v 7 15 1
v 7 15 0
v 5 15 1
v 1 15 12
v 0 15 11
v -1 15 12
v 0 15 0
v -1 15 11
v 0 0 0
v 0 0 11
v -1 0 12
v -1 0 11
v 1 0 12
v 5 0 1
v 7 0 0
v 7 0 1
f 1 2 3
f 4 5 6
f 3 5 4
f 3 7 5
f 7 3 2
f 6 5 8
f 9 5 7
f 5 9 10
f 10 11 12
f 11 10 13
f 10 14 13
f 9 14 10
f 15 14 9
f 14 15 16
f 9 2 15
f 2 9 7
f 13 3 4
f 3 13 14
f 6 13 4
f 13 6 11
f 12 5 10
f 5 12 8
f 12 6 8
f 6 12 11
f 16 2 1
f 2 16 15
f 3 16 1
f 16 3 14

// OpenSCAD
hull() {
    cube([5,15,1]);
    cube([1,15,12]);
}
translate([-1,0,11])
    cube([1,15,1]);


translate([5,0,0])
    cube([2,15,1]);
